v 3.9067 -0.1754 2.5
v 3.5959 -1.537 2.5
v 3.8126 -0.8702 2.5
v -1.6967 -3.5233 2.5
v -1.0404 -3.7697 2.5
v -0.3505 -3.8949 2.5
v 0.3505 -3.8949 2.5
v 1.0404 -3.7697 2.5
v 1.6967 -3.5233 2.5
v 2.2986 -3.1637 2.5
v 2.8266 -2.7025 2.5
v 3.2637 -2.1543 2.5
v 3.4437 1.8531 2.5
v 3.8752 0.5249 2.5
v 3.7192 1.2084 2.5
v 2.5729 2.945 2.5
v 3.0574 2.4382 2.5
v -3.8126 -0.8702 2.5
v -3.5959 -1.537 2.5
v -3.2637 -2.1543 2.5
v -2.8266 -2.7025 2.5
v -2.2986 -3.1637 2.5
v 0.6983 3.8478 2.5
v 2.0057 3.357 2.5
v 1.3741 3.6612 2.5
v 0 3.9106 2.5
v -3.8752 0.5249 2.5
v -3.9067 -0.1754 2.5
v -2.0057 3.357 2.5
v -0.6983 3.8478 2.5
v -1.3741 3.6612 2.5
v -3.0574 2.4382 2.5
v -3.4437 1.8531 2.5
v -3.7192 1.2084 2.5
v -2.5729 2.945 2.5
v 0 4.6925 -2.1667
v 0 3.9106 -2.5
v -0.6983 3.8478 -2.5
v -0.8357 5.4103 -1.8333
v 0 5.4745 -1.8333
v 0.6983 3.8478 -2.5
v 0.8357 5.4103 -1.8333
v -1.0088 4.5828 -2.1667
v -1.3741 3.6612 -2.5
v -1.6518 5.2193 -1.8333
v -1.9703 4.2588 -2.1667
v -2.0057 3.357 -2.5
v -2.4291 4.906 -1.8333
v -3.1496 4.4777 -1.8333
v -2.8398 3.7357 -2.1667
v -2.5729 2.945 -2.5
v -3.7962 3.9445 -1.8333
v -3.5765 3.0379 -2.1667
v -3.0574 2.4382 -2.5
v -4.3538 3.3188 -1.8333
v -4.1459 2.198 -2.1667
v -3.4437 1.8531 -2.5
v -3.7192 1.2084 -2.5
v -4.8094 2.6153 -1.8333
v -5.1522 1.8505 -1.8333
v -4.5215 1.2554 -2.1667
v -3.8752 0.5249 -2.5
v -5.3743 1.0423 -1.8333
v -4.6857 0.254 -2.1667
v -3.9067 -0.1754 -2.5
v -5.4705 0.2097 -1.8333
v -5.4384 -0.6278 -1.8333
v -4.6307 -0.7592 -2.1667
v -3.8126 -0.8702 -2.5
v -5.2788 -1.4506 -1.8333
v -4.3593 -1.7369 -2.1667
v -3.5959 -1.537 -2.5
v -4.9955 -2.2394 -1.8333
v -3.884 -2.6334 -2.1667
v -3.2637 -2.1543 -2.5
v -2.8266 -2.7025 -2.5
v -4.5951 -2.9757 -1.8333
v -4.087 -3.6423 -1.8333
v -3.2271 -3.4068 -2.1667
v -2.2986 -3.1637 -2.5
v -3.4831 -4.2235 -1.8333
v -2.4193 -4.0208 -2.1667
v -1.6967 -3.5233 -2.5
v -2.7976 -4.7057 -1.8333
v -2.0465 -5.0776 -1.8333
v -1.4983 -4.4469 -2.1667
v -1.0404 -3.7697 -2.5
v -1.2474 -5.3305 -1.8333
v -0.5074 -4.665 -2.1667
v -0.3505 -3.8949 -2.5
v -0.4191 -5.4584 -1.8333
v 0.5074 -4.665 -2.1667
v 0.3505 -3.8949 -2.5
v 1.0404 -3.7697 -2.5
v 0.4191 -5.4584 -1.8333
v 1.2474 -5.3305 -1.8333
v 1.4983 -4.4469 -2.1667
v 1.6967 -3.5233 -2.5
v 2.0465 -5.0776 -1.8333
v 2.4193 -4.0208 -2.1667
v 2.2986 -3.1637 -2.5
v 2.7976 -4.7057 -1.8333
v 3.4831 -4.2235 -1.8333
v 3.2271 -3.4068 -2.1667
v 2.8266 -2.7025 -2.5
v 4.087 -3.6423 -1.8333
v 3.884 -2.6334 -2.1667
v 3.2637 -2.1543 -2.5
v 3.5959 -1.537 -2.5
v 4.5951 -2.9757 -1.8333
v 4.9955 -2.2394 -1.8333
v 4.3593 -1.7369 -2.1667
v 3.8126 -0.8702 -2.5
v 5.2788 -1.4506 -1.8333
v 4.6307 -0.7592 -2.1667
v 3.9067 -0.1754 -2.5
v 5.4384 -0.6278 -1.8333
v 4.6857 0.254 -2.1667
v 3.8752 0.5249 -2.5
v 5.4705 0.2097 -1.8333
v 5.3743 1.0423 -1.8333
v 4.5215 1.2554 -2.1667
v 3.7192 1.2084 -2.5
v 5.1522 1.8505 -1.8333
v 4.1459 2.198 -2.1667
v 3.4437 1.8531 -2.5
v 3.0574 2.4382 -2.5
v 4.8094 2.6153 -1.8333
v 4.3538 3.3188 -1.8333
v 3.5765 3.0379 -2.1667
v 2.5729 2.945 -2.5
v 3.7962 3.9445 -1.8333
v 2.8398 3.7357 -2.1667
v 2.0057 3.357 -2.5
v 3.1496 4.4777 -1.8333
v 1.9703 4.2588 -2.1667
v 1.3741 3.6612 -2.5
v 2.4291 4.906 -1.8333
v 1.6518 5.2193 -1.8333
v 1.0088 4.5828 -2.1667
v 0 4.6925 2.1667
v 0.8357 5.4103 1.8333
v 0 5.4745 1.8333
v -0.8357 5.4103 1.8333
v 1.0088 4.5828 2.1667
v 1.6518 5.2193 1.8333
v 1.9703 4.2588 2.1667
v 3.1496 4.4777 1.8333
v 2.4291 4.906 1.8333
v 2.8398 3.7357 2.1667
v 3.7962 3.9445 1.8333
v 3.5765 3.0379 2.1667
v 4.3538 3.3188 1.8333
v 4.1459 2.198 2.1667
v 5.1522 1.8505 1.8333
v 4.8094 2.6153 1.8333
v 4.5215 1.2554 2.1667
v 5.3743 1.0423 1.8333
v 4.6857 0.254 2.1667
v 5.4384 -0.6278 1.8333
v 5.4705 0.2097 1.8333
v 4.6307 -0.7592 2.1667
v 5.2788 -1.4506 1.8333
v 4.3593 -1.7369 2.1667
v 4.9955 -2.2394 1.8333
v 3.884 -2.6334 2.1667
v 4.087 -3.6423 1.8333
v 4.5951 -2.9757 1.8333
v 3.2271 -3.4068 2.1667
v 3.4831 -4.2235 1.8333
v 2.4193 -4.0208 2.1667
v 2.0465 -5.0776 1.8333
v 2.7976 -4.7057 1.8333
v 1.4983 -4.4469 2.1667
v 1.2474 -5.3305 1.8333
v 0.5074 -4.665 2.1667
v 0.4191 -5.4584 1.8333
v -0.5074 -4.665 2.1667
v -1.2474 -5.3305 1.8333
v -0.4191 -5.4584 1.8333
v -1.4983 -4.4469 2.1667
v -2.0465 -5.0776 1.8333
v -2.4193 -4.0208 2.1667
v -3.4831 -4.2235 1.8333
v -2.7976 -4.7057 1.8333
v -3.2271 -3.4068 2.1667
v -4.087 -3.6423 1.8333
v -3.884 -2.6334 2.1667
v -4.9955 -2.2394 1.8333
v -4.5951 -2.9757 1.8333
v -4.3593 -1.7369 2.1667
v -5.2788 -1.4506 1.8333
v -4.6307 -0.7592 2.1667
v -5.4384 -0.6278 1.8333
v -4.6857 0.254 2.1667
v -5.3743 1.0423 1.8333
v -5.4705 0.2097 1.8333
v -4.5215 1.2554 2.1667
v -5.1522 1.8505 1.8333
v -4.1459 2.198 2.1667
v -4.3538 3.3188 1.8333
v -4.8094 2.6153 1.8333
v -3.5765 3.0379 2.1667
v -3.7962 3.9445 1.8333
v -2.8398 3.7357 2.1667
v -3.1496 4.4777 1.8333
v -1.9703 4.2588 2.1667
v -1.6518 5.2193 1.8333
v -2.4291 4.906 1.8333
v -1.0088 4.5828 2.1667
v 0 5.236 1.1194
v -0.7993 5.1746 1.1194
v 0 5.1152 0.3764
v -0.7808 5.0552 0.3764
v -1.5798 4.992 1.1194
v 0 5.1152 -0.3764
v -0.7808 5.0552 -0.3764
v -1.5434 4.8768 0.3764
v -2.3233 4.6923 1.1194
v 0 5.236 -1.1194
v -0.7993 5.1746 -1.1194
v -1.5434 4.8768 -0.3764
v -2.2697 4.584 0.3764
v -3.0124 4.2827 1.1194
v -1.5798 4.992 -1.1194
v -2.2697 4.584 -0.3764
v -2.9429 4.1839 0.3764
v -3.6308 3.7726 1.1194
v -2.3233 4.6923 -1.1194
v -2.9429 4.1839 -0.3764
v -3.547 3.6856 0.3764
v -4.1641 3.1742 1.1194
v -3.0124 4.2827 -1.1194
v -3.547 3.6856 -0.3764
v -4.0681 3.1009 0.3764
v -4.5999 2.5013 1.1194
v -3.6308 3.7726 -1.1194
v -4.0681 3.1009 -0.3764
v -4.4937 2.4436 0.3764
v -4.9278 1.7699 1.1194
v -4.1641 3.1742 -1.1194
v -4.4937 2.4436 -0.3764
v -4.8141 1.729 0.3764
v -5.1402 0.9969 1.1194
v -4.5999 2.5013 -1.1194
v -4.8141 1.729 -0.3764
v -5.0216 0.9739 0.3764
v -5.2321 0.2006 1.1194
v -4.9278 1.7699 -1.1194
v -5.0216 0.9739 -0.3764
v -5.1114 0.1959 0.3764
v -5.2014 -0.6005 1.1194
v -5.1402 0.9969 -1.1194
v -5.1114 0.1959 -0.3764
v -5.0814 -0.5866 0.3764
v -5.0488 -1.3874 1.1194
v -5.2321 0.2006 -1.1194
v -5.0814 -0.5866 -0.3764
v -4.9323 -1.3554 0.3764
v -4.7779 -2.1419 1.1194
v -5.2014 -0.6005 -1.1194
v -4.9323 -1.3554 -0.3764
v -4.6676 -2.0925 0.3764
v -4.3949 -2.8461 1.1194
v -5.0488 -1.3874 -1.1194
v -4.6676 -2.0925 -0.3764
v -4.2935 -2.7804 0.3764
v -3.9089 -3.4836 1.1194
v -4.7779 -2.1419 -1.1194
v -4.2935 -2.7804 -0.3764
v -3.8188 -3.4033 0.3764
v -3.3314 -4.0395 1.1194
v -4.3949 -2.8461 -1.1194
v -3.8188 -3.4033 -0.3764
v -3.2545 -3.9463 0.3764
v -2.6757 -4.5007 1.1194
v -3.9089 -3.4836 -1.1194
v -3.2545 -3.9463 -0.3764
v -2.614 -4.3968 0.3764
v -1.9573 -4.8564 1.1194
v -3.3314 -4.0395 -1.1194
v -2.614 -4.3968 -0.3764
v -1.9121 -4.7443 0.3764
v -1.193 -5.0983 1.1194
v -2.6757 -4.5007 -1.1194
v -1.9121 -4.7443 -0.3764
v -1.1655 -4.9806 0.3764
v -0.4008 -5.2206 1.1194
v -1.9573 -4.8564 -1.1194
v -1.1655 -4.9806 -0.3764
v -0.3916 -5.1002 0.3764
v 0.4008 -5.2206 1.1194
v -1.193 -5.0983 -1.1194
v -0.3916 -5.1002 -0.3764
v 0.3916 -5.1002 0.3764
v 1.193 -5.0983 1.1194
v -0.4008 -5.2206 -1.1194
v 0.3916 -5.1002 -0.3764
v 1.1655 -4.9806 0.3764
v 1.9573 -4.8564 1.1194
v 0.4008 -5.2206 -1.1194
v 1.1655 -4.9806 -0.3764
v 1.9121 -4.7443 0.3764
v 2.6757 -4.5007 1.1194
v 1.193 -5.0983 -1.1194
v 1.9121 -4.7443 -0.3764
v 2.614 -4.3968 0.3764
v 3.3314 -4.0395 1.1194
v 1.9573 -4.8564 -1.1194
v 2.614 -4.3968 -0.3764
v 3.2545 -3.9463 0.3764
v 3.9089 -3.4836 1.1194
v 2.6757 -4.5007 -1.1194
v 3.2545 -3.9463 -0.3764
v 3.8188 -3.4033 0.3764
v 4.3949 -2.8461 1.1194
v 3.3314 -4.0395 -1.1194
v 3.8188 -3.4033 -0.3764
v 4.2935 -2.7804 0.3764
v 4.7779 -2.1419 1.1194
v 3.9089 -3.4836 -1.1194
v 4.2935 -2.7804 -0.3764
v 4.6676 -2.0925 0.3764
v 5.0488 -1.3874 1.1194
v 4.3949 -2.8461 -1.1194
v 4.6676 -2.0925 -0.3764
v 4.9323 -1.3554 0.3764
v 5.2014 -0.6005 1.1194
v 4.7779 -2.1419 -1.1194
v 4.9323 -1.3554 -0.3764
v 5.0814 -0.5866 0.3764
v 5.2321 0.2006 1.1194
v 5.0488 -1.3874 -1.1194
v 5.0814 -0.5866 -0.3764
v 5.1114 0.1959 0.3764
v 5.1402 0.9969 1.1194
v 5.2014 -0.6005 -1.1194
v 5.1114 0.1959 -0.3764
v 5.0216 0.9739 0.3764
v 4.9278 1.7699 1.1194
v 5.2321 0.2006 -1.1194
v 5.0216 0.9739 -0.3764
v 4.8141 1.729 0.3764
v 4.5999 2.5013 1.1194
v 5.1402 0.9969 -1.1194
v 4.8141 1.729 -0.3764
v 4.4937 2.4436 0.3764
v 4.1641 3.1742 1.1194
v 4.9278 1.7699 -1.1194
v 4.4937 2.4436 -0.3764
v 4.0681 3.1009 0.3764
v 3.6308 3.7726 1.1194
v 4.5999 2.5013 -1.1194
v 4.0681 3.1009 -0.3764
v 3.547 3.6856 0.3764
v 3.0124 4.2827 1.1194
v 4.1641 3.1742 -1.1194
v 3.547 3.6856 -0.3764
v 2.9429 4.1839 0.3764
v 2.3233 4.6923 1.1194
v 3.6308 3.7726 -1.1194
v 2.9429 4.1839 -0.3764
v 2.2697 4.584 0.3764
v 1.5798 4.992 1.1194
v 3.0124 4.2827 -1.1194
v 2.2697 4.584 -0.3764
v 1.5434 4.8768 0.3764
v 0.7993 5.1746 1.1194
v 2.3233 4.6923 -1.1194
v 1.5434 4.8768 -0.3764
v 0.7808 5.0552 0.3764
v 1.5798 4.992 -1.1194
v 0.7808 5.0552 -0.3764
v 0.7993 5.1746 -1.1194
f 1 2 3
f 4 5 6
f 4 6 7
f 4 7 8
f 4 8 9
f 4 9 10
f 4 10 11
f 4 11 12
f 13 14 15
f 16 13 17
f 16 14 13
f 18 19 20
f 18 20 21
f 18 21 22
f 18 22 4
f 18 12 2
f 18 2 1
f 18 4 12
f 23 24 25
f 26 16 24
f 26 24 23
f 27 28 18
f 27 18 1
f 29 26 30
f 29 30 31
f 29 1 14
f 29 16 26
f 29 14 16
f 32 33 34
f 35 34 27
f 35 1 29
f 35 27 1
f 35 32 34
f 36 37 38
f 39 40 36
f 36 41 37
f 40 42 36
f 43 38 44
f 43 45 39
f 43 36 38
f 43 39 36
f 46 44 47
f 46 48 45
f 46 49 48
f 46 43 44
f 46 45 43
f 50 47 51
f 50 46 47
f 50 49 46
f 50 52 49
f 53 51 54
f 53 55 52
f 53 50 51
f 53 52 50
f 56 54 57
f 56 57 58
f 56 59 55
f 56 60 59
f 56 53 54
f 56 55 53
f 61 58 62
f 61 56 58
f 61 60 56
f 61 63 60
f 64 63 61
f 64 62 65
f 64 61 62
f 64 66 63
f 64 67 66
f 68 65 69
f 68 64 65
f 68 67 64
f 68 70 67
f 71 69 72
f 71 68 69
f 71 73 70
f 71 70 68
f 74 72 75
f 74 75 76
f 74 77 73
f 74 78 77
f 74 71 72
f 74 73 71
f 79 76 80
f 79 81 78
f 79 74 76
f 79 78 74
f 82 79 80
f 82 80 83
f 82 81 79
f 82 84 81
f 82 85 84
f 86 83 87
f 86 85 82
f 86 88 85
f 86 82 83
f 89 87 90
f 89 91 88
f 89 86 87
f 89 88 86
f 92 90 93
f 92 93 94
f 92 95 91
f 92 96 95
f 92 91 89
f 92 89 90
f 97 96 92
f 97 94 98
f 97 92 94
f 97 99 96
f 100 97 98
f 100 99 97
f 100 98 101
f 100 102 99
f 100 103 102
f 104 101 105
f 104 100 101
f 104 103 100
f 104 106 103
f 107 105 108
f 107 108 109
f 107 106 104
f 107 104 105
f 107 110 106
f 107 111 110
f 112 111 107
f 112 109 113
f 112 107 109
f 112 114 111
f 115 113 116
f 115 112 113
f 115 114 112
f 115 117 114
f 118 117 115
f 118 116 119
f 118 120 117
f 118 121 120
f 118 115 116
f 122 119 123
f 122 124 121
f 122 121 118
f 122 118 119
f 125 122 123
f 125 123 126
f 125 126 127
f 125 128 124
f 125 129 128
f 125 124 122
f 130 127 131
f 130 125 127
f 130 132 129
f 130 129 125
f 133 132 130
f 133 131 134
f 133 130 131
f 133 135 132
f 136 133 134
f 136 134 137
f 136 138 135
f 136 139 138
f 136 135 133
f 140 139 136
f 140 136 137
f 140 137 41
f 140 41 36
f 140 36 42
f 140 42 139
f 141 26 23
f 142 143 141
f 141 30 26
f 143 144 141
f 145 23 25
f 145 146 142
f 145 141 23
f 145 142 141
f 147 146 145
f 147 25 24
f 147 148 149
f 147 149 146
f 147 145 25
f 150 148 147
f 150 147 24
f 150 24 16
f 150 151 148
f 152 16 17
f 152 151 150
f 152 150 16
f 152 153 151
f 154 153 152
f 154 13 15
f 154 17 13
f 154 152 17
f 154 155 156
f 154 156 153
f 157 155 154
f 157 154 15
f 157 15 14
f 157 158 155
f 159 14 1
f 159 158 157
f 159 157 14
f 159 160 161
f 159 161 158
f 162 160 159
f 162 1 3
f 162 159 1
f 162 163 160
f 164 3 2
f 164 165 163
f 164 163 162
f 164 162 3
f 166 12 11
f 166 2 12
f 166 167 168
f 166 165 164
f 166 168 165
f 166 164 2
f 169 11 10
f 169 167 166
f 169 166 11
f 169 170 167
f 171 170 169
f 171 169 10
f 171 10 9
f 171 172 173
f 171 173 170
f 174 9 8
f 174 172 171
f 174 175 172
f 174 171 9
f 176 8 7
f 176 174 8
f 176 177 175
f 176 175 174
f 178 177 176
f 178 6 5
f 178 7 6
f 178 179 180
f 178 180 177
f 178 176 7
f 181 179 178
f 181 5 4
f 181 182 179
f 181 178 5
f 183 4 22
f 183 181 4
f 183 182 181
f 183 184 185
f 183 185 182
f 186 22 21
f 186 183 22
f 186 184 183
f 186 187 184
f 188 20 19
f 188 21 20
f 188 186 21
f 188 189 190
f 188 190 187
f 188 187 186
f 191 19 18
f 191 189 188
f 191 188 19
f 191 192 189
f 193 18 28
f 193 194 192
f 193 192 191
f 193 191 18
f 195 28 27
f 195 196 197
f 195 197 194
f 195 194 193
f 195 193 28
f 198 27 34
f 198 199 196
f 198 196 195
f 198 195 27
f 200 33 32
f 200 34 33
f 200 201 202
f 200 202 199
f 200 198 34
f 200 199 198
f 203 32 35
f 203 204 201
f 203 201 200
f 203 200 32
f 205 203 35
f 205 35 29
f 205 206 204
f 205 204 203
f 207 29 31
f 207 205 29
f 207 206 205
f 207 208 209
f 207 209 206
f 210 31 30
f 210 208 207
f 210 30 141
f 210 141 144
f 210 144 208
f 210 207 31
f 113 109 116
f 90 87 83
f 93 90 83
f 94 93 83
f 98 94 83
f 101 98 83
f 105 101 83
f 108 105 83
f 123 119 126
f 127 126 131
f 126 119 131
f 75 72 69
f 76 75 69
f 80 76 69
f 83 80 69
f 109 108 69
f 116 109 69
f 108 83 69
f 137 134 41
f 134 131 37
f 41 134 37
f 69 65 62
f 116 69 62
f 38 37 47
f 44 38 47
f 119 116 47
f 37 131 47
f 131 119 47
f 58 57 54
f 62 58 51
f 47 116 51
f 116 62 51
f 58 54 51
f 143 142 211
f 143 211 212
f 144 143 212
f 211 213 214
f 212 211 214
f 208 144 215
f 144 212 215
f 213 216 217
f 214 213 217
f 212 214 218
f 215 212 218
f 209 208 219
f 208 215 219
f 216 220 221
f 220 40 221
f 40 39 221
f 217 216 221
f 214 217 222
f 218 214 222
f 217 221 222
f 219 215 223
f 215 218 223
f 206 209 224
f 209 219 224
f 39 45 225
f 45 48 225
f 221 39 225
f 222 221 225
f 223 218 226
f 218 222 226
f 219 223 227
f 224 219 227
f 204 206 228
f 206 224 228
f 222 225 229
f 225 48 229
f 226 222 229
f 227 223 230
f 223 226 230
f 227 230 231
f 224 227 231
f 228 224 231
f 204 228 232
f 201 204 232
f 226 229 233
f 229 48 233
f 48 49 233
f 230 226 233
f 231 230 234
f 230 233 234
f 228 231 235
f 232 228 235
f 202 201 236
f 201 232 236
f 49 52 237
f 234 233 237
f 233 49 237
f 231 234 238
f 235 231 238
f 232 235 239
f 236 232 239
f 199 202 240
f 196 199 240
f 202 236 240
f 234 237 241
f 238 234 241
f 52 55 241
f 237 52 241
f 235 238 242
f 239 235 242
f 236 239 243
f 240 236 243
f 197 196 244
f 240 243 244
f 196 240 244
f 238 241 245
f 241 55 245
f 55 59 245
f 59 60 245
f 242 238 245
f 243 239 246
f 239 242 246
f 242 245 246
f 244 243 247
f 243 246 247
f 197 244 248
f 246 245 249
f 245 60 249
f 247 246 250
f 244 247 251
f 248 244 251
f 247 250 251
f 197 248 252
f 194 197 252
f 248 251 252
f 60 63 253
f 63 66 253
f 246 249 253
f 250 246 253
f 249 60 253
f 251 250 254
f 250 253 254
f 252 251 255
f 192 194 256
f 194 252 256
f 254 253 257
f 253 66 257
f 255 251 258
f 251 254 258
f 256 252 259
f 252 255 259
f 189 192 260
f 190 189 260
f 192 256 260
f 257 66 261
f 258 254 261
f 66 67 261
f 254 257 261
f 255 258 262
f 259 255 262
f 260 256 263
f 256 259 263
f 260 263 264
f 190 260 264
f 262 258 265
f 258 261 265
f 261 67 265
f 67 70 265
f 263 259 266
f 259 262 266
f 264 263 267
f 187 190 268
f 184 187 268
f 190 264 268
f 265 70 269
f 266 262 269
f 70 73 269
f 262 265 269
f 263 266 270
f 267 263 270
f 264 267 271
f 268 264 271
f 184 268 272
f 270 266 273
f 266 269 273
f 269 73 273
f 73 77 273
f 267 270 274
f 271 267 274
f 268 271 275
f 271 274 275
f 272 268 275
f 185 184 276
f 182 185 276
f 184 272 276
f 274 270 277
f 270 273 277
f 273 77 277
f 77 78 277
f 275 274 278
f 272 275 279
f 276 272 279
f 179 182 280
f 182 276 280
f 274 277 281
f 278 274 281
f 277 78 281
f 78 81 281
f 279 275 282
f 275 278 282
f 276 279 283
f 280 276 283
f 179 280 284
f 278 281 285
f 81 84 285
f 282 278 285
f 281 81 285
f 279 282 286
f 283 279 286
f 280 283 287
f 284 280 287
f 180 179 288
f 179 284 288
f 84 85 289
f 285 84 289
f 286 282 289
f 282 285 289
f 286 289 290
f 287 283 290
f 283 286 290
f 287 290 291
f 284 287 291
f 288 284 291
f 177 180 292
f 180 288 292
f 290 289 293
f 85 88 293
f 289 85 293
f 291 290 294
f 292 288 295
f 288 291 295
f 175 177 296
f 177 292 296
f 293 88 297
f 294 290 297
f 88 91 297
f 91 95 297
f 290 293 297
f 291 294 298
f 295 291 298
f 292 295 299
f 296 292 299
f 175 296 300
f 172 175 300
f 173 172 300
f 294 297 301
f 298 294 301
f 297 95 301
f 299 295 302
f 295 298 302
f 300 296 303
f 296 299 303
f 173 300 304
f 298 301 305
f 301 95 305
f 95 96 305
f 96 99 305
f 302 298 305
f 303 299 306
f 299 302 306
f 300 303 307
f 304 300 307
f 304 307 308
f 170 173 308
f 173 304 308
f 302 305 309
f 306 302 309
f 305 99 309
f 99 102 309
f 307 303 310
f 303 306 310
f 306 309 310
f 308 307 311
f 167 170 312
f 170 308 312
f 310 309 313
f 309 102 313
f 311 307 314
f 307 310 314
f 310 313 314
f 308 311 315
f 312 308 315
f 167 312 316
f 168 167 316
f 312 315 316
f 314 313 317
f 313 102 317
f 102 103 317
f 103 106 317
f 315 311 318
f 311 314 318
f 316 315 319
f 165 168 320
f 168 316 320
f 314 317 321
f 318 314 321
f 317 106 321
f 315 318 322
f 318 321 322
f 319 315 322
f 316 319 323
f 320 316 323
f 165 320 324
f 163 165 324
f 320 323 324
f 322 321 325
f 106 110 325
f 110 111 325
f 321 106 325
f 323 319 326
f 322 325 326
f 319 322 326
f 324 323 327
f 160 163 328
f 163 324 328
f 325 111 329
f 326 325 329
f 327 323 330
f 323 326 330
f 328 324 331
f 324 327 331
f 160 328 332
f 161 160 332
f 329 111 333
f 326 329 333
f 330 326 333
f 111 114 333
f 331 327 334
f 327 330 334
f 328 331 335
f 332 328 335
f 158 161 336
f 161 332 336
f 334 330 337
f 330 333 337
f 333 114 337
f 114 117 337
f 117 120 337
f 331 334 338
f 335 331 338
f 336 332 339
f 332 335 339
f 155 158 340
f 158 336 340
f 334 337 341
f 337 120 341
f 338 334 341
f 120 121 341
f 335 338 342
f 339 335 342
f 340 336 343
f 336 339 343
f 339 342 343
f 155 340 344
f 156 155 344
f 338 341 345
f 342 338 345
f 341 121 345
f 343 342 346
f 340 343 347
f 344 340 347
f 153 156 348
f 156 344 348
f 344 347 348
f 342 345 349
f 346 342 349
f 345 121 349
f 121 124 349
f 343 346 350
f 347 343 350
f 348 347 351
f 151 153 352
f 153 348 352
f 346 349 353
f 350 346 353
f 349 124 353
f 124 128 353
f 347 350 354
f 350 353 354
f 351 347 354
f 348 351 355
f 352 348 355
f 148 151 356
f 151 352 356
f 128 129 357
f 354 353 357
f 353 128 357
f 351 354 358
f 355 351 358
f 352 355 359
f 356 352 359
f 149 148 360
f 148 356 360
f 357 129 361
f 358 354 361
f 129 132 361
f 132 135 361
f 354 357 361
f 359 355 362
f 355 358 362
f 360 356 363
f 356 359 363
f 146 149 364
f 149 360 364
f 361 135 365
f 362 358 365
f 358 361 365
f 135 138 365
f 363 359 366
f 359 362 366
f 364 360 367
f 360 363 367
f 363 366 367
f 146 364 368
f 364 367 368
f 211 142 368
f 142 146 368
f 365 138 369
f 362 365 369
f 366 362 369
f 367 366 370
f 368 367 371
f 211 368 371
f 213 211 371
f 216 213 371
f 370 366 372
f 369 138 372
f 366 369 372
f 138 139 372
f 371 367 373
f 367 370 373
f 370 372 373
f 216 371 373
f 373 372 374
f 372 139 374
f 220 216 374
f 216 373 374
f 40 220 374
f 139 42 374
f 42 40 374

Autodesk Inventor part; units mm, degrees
ref_plane "Zahnebene" through (0, -10, 0) normal (-0.2940858, 0, 0.955779) x (0, 1, 0)
sketch "Grundkörperskizze" plane through (0, 0, 0) normal (1, 0, 0) x (0, 1, 0)
  line L0 (0, -5.95) -> (0, 5.95) projected
  line L1 (0, 2.5) -> (3.9106, 2.5)
  line L2 (3.9106, 2.5) -> (5.525, 1.8118)
  line L3 (-2.72, 0) -> (16.32, 0) construction
  circle A0 centre (9.775, 0) radius 4.675
  line L4 (5.525, 1.8118) -> (5.525, -1.8118)
  line L5 (0, -2.5) -> (3.9106, -2.5)
  line L6 (0, 2.5) -> (0, -2.5)
  line L7 (3.9106, -2.5) -> (5.525, -1.8118)
  dimension "d50" = 23.089
  dimension "d87" = 11.05
  dimension "d89" = 9.35
  dimension "d92" = 5
  dimension "d93" = 9.775
revolve "Grundkörper" add sketch "Grundkörperskizze" angle 360 about axis through (0, 0, 0) along (0, 0, 1) picked at (5.4149, 0.3119) contours L0 L1 L2 A0 L7 L5 | A0 L2 L4 L7
revolve "Grundkörper2" cut sketch "Grundkörperskizze" angle 360 about axis through (0, 0, 0) along (0, 0, 1) contours L7 L4 L2 A0 | A0 L2 L4 L7
sketch "Zahnskizze" plane through (0, -10, 0) normal (-0.2940858, 0, 0.955779) x (0, 1, 0)
  line L0 (10, 1.6413) -> (10, -1.6413) projected
  line L1 (-0.574, 0) -> (7.994, 0) projected
  line L2 (0.225, 1.1724) -> (0.225, -1.1724)
  line L3 (0.225, -1.1724) -> (4.73, -1.1724)
  line L4 (4.73, -1.1724) -> (6.77, -0.4299)
  line L5 (6.77, -0.4299) -> (6.77, 0)
  line L6 (6.77, 0.4299) -> (4.73, 1.1724)
  line L7 (4.73, 1.1724) -> (0.225, 1.1724)
  line L8 (6.77, 0.4299) -> (6.77, 0)
  line L9 (5.75, 0) -> (5.75, -0.8011) construction
  dimension "d38" = 9.775
  dimension "d39" = 20
  dimension "d40" = 4.505
  dimension "d41" = 5.525
  dimension "d42" = 0.8011
sketch "Sketch8" plane through (0, 0, 2.5) normal (0, 0, 1) x (1, 0, 0)
  circle A0 centre (0, 0) radius 3.9106 projected
  circle A1 centre (0, 0) radius 4.25
  dimension "d77" = 8.5
surface extrude "Flankendurchmesser" sketch "Sketch8" against normal blind 5 shown no curves A1
ref_plane "Work Plane13" through (0, 0, 0) normal (-0.309017, 0.9510565, 0) x (0, 0, 1)
revolve "Zahn" [suppressed]
pattern_circular "Zahnanordnung" [suppressed]
ref_plane "Work Plane14" through (0, 0, 0) normal (0.9510565, 0.309017, 0) x (0, 0, 1)
ref_plane "Work Plane15" through (0, 0, 0) normal (0, -1, 0) x (0, 0, 1)
equation "\"d50\" = da_fi"
equation "\"d87\" = da_dae"
equation "\"d89\" = 2 * da_aw - da_da"
equation "\"d92\" = da_b"
equation "\"d93\" = da_aw"
equation "\"d38\" = da_aw"
equation "\"d39\" = da_alfat"
equation "\"d40\" = 0.5 * da_df1"
equation "\"d41\" = 0.5 * da_d1"
equation "\"d42\" = 0.3 * da_px"
equation "\"d77\" = da_dw"
equation "\"d78\" = da_b"
equation "\"da_aw\" = 9.775"
equation "\"da_fi\" = 23.0888deg"
equation "\"da_b\" = 5"
equation "\"da_df\" = 6.46"
equation "\"da_da\" = 10.2"
equation "\"da_beta\" = 17.102729deg"
equation "\"da_alfat\" = 20deg"
equation "\"da_df1\" = 9.01"
equation "\"da_da1\" = 12.75"
equation "\"da_d1\" = 11.05"
equation "\"da_px\" = 2.67035"
equation "\"d68\" = da_aw"
equation "\"da_dw\" = 8.5"
equation "\"da_rightdir\" = 0"
equation "\"d86\" = da_aw"
equation "\"da_dae\" = 11.05"
properties part number "Schneckenrad" material "Steel, Mild"
